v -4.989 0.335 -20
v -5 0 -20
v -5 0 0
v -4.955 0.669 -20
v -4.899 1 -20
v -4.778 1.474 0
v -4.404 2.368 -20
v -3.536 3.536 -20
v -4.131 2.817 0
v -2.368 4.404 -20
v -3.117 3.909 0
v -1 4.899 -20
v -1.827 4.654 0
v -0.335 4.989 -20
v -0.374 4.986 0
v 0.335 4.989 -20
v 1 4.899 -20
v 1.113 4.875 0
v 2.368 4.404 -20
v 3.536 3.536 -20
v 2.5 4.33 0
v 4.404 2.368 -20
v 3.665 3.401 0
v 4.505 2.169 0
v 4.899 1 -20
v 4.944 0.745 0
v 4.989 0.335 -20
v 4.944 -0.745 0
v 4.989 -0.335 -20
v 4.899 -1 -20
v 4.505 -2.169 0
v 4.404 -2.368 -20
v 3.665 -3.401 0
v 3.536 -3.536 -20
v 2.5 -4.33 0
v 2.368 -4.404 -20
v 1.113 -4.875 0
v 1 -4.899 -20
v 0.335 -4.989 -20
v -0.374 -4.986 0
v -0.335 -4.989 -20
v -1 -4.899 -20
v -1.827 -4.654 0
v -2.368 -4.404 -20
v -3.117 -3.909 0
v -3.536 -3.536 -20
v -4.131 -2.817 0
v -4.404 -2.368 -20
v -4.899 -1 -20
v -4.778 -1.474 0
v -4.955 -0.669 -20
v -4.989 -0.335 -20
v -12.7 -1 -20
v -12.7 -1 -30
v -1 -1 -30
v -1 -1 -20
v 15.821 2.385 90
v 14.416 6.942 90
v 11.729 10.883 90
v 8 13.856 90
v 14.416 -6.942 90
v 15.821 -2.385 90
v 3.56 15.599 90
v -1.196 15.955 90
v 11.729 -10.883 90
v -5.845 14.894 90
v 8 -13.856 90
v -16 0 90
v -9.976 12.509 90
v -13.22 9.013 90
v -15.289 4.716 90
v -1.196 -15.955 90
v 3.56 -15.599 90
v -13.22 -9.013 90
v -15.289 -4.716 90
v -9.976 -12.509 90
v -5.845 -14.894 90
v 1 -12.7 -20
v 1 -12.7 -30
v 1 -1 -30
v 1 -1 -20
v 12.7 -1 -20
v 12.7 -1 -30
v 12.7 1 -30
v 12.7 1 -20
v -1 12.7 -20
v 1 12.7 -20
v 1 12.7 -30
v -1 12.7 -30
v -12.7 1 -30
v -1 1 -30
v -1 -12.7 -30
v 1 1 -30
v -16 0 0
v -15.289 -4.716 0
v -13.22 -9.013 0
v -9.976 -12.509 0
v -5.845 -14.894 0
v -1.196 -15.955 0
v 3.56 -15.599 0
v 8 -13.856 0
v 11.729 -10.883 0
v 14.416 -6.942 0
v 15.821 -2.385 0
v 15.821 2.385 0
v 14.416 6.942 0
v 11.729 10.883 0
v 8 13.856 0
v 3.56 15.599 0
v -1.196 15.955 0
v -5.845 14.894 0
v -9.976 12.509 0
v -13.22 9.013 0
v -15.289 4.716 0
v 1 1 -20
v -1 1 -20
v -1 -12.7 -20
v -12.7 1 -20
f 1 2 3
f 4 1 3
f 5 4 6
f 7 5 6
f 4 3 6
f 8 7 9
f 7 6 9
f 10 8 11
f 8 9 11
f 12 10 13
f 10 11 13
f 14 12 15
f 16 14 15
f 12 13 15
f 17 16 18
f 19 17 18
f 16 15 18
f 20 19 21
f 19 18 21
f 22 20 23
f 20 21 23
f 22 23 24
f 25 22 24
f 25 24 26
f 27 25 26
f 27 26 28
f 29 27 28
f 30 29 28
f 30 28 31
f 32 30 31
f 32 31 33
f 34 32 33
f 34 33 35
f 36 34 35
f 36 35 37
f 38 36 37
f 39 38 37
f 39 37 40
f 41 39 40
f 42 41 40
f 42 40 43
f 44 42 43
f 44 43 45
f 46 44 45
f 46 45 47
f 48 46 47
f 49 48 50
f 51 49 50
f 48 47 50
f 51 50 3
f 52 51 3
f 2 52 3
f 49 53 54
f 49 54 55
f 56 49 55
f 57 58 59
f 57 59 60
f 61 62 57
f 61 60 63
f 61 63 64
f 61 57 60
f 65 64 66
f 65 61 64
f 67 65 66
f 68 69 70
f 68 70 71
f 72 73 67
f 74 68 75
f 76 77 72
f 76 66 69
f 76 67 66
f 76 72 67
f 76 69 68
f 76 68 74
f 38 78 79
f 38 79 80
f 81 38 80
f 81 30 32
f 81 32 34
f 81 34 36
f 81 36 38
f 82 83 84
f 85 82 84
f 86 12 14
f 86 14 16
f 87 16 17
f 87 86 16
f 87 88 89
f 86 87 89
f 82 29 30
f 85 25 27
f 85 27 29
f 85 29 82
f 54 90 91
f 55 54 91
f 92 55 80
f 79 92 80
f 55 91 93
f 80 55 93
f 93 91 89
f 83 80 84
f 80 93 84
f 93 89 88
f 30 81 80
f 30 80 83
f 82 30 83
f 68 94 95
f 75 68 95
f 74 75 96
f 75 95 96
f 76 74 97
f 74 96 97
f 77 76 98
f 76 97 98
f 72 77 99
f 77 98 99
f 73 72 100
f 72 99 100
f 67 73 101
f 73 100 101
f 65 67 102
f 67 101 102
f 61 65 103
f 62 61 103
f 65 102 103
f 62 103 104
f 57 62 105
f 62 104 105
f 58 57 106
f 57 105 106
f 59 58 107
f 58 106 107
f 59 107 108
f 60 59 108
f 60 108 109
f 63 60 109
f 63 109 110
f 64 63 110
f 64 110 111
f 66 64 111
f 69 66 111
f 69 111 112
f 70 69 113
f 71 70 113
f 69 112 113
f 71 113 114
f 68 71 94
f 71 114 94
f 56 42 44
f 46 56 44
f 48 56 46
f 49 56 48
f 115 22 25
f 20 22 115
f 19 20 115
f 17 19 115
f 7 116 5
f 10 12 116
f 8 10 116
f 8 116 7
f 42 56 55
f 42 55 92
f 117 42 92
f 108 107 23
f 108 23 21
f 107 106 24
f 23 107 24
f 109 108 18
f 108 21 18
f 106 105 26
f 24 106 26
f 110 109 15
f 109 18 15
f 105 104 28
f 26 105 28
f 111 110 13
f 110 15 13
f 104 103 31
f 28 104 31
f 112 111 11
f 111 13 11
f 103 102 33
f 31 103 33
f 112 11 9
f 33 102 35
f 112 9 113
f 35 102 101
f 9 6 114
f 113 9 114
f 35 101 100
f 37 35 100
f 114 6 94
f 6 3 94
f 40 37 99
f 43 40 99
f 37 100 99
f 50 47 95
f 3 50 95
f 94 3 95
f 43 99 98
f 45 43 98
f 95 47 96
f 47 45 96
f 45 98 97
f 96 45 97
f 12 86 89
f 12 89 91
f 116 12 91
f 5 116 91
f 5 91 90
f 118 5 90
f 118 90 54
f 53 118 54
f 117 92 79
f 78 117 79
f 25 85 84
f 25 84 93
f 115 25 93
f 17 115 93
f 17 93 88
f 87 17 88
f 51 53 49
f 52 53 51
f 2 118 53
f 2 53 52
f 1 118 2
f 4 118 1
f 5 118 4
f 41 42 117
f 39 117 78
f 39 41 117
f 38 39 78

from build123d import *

# Parameters (mm, degrees)
SKETCH2_R           = 16
BOSS_EXTRUDE1_DEPTH = 90
SKETCH3_R           = 5
BOSS_EXTRUDE2_DEPTH = 20
BOSS_EXTRUDE4_DEPTH = 10


with BuildPart() as part:
    # Sketch2 → Boss-Extrude1 (new body)
    with BuildSketch(Plane.XY):
        with Locations(Location((0, 0, 0), (0, 0, 180))):
            Circle(SKETCH2_R)
    extrude(amount=BOSS_EXTRUDE1_DEPTH)

    # Sketch3 → Boss-Extrude2 (add)
    with BuildSketch(Plane(origin=(0, 0, 0), x_dir=(-1, 0, 0), z_dir=(0, 0, -1))):
        Circle(SKETCH3_R)
    extrude(amount=BOSS_EXTRUDE2_DEPTH)

    # Sketch5 → Boss-Extrude4 (add)
    with BuildSketch(Plane(origin=(0, 0, -20), x_dir=(-1, 0, 0), z_dir=(0, 0, -1))):
        Polygon((1, 1), (12.7, 1), (12.7, -1), (1, -1), (1, -12.7), (-1, -12.7), (-1, -1), (-12.7, -1), (-12.7, 1), (-1, 1), (-1, 12.7), (1, 12.7), align=None)
    extrude(amount=BOSS_EXTRUDE4_DEPTH)


solid = part.part
